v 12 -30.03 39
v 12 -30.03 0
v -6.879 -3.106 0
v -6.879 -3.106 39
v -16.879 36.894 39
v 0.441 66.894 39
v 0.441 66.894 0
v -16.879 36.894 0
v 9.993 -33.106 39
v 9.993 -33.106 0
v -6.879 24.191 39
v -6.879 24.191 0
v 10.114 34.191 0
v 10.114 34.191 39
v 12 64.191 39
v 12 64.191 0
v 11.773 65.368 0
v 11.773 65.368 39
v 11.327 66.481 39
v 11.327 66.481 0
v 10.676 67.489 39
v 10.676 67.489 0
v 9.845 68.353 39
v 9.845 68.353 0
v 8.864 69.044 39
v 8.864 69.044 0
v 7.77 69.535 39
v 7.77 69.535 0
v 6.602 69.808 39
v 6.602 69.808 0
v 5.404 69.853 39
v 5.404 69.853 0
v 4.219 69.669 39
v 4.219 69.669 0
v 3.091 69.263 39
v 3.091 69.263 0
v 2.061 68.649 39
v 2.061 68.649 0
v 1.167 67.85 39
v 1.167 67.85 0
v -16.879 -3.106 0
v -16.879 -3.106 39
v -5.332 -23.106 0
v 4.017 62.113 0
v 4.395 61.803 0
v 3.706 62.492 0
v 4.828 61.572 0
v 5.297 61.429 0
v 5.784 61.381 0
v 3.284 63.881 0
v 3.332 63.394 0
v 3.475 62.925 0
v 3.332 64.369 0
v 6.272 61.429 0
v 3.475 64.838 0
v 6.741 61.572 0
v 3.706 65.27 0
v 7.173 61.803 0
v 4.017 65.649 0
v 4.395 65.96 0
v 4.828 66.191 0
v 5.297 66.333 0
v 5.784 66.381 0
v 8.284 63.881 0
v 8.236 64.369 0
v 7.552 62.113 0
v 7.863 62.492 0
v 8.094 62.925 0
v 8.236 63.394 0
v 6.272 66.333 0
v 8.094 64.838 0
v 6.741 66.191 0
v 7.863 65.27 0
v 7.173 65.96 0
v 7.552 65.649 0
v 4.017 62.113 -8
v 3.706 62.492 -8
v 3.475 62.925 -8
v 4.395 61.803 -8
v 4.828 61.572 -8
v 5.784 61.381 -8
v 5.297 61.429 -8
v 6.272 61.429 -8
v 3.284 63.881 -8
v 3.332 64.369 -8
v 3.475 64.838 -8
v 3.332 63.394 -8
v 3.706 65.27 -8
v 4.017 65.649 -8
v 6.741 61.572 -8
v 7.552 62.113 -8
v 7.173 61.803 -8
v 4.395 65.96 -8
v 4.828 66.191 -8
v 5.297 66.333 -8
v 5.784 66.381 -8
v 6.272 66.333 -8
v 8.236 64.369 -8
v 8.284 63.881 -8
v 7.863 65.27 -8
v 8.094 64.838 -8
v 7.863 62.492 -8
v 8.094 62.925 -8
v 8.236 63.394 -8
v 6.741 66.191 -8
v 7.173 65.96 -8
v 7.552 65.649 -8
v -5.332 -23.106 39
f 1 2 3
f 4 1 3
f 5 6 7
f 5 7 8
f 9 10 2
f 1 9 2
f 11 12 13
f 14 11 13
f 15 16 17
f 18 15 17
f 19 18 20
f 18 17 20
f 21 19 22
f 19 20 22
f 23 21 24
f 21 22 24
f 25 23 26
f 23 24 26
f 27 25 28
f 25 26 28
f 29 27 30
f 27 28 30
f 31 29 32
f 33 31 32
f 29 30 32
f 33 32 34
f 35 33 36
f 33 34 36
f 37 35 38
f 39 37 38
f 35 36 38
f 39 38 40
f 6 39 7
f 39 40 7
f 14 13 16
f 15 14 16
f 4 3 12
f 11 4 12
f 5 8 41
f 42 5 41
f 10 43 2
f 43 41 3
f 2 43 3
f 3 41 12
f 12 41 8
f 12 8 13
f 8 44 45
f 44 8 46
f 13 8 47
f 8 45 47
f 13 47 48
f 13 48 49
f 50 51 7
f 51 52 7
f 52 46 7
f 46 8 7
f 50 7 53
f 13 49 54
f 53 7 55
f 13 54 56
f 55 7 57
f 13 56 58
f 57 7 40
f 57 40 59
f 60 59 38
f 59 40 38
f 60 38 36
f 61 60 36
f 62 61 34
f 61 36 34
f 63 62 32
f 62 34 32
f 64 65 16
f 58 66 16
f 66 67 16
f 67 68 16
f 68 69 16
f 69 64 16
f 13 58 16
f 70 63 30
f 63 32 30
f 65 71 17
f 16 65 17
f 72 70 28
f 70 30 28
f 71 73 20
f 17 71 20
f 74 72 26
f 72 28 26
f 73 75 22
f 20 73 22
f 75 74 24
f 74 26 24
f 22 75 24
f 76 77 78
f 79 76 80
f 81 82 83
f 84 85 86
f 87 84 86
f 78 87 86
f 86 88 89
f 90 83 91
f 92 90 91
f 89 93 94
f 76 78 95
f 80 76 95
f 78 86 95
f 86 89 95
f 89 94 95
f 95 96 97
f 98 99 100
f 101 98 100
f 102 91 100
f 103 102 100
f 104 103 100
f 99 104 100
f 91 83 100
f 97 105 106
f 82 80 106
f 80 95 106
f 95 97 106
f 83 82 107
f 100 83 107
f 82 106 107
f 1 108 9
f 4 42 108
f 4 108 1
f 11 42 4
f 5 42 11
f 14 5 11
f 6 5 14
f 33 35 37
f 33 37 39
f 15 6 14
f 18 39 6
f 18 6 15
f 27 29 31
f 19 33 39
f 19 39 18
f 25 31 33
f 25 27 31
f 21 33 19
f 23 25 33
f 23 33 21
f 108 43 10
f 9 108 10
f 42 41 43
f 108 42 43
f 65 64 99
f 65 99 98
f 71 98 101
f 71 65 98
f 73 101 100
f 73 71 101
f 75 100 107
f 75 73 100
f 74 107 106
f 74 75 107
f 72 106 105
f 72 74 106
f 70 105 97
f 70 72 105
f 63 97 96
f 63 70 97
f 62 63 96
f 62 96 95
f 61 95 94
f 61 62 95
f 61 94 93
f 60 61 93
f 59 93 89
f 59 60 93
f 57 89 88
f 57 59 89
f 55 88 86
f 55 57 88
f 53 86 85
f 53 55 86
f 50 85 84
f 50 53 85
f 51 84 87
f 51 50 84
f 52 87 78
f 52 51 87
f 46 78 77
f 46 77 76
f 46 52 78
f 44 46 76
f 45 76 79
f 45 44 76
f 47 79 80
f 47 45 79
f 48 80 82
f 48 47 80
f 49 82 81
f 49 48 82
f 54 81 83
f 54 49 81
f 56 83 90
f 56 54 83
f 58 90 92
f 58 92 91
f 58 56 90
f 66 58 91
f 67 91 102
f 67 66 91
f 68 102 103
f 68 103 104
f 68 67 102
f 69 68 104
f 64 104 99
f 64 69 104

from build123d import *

# Parameters (mm, degrees)
EXTRUDE_4_DEPTH = 39
SKETCH_2_R      = 2.5
EXTRUDE_5_DEPTH = 8


with BuildPart() as part:
    # 草图1 → 凸台-拉伸4 (new body)
    with BuildSketch(Plane.XY):
        with BuildLine():
            ThreePointArc((11.999755772, 64.190702015), (7.19287537, 69.699227744), (0.441332655, 66.894477154))
            Line((0.441332655, 66.894477154), (-16.87917542, 36.894477154))
            Line((-16.87917542, 36.894477154), (-16.87917542, -3.105522846))
            Line((-16.87917542, -3.105522846), (-5.332170037, -23.105522846))
            Line((-5.332170037, -23.105522846), (9.992741519, -33.105522846))
            Line((9.992741519, -33.105522846), (11.999755772, -30.029791253))
            Line((11.999755772, -30.029791253), (-6.87917542, -3.105522846))
            Line((-6.87917542, -3.105522846), (-6.87917542, 14.190702015))
            Line((-6.87917542, 14.190702015), (-6.87917542, 24.190702015))
            Line((-6.87917542, 24.190702015), (10.114332844, 34.190702015))
            Line((10.114332844, 34.190702015), (11.999755772, 64.190702015))
        make_face()
    extrude(amount=EXTRUDE_4_DEPTH)

    # 草图2 → 凸台-拉伸5 (add)
    with BuildSketch(Plane.XY):
        with Locations((5.784422652, 63.881230161)):
            Circle(SKETCH_2_R)
    extrude(amount=-EXTRUDE_5_DEPTH)


solid = part.part
